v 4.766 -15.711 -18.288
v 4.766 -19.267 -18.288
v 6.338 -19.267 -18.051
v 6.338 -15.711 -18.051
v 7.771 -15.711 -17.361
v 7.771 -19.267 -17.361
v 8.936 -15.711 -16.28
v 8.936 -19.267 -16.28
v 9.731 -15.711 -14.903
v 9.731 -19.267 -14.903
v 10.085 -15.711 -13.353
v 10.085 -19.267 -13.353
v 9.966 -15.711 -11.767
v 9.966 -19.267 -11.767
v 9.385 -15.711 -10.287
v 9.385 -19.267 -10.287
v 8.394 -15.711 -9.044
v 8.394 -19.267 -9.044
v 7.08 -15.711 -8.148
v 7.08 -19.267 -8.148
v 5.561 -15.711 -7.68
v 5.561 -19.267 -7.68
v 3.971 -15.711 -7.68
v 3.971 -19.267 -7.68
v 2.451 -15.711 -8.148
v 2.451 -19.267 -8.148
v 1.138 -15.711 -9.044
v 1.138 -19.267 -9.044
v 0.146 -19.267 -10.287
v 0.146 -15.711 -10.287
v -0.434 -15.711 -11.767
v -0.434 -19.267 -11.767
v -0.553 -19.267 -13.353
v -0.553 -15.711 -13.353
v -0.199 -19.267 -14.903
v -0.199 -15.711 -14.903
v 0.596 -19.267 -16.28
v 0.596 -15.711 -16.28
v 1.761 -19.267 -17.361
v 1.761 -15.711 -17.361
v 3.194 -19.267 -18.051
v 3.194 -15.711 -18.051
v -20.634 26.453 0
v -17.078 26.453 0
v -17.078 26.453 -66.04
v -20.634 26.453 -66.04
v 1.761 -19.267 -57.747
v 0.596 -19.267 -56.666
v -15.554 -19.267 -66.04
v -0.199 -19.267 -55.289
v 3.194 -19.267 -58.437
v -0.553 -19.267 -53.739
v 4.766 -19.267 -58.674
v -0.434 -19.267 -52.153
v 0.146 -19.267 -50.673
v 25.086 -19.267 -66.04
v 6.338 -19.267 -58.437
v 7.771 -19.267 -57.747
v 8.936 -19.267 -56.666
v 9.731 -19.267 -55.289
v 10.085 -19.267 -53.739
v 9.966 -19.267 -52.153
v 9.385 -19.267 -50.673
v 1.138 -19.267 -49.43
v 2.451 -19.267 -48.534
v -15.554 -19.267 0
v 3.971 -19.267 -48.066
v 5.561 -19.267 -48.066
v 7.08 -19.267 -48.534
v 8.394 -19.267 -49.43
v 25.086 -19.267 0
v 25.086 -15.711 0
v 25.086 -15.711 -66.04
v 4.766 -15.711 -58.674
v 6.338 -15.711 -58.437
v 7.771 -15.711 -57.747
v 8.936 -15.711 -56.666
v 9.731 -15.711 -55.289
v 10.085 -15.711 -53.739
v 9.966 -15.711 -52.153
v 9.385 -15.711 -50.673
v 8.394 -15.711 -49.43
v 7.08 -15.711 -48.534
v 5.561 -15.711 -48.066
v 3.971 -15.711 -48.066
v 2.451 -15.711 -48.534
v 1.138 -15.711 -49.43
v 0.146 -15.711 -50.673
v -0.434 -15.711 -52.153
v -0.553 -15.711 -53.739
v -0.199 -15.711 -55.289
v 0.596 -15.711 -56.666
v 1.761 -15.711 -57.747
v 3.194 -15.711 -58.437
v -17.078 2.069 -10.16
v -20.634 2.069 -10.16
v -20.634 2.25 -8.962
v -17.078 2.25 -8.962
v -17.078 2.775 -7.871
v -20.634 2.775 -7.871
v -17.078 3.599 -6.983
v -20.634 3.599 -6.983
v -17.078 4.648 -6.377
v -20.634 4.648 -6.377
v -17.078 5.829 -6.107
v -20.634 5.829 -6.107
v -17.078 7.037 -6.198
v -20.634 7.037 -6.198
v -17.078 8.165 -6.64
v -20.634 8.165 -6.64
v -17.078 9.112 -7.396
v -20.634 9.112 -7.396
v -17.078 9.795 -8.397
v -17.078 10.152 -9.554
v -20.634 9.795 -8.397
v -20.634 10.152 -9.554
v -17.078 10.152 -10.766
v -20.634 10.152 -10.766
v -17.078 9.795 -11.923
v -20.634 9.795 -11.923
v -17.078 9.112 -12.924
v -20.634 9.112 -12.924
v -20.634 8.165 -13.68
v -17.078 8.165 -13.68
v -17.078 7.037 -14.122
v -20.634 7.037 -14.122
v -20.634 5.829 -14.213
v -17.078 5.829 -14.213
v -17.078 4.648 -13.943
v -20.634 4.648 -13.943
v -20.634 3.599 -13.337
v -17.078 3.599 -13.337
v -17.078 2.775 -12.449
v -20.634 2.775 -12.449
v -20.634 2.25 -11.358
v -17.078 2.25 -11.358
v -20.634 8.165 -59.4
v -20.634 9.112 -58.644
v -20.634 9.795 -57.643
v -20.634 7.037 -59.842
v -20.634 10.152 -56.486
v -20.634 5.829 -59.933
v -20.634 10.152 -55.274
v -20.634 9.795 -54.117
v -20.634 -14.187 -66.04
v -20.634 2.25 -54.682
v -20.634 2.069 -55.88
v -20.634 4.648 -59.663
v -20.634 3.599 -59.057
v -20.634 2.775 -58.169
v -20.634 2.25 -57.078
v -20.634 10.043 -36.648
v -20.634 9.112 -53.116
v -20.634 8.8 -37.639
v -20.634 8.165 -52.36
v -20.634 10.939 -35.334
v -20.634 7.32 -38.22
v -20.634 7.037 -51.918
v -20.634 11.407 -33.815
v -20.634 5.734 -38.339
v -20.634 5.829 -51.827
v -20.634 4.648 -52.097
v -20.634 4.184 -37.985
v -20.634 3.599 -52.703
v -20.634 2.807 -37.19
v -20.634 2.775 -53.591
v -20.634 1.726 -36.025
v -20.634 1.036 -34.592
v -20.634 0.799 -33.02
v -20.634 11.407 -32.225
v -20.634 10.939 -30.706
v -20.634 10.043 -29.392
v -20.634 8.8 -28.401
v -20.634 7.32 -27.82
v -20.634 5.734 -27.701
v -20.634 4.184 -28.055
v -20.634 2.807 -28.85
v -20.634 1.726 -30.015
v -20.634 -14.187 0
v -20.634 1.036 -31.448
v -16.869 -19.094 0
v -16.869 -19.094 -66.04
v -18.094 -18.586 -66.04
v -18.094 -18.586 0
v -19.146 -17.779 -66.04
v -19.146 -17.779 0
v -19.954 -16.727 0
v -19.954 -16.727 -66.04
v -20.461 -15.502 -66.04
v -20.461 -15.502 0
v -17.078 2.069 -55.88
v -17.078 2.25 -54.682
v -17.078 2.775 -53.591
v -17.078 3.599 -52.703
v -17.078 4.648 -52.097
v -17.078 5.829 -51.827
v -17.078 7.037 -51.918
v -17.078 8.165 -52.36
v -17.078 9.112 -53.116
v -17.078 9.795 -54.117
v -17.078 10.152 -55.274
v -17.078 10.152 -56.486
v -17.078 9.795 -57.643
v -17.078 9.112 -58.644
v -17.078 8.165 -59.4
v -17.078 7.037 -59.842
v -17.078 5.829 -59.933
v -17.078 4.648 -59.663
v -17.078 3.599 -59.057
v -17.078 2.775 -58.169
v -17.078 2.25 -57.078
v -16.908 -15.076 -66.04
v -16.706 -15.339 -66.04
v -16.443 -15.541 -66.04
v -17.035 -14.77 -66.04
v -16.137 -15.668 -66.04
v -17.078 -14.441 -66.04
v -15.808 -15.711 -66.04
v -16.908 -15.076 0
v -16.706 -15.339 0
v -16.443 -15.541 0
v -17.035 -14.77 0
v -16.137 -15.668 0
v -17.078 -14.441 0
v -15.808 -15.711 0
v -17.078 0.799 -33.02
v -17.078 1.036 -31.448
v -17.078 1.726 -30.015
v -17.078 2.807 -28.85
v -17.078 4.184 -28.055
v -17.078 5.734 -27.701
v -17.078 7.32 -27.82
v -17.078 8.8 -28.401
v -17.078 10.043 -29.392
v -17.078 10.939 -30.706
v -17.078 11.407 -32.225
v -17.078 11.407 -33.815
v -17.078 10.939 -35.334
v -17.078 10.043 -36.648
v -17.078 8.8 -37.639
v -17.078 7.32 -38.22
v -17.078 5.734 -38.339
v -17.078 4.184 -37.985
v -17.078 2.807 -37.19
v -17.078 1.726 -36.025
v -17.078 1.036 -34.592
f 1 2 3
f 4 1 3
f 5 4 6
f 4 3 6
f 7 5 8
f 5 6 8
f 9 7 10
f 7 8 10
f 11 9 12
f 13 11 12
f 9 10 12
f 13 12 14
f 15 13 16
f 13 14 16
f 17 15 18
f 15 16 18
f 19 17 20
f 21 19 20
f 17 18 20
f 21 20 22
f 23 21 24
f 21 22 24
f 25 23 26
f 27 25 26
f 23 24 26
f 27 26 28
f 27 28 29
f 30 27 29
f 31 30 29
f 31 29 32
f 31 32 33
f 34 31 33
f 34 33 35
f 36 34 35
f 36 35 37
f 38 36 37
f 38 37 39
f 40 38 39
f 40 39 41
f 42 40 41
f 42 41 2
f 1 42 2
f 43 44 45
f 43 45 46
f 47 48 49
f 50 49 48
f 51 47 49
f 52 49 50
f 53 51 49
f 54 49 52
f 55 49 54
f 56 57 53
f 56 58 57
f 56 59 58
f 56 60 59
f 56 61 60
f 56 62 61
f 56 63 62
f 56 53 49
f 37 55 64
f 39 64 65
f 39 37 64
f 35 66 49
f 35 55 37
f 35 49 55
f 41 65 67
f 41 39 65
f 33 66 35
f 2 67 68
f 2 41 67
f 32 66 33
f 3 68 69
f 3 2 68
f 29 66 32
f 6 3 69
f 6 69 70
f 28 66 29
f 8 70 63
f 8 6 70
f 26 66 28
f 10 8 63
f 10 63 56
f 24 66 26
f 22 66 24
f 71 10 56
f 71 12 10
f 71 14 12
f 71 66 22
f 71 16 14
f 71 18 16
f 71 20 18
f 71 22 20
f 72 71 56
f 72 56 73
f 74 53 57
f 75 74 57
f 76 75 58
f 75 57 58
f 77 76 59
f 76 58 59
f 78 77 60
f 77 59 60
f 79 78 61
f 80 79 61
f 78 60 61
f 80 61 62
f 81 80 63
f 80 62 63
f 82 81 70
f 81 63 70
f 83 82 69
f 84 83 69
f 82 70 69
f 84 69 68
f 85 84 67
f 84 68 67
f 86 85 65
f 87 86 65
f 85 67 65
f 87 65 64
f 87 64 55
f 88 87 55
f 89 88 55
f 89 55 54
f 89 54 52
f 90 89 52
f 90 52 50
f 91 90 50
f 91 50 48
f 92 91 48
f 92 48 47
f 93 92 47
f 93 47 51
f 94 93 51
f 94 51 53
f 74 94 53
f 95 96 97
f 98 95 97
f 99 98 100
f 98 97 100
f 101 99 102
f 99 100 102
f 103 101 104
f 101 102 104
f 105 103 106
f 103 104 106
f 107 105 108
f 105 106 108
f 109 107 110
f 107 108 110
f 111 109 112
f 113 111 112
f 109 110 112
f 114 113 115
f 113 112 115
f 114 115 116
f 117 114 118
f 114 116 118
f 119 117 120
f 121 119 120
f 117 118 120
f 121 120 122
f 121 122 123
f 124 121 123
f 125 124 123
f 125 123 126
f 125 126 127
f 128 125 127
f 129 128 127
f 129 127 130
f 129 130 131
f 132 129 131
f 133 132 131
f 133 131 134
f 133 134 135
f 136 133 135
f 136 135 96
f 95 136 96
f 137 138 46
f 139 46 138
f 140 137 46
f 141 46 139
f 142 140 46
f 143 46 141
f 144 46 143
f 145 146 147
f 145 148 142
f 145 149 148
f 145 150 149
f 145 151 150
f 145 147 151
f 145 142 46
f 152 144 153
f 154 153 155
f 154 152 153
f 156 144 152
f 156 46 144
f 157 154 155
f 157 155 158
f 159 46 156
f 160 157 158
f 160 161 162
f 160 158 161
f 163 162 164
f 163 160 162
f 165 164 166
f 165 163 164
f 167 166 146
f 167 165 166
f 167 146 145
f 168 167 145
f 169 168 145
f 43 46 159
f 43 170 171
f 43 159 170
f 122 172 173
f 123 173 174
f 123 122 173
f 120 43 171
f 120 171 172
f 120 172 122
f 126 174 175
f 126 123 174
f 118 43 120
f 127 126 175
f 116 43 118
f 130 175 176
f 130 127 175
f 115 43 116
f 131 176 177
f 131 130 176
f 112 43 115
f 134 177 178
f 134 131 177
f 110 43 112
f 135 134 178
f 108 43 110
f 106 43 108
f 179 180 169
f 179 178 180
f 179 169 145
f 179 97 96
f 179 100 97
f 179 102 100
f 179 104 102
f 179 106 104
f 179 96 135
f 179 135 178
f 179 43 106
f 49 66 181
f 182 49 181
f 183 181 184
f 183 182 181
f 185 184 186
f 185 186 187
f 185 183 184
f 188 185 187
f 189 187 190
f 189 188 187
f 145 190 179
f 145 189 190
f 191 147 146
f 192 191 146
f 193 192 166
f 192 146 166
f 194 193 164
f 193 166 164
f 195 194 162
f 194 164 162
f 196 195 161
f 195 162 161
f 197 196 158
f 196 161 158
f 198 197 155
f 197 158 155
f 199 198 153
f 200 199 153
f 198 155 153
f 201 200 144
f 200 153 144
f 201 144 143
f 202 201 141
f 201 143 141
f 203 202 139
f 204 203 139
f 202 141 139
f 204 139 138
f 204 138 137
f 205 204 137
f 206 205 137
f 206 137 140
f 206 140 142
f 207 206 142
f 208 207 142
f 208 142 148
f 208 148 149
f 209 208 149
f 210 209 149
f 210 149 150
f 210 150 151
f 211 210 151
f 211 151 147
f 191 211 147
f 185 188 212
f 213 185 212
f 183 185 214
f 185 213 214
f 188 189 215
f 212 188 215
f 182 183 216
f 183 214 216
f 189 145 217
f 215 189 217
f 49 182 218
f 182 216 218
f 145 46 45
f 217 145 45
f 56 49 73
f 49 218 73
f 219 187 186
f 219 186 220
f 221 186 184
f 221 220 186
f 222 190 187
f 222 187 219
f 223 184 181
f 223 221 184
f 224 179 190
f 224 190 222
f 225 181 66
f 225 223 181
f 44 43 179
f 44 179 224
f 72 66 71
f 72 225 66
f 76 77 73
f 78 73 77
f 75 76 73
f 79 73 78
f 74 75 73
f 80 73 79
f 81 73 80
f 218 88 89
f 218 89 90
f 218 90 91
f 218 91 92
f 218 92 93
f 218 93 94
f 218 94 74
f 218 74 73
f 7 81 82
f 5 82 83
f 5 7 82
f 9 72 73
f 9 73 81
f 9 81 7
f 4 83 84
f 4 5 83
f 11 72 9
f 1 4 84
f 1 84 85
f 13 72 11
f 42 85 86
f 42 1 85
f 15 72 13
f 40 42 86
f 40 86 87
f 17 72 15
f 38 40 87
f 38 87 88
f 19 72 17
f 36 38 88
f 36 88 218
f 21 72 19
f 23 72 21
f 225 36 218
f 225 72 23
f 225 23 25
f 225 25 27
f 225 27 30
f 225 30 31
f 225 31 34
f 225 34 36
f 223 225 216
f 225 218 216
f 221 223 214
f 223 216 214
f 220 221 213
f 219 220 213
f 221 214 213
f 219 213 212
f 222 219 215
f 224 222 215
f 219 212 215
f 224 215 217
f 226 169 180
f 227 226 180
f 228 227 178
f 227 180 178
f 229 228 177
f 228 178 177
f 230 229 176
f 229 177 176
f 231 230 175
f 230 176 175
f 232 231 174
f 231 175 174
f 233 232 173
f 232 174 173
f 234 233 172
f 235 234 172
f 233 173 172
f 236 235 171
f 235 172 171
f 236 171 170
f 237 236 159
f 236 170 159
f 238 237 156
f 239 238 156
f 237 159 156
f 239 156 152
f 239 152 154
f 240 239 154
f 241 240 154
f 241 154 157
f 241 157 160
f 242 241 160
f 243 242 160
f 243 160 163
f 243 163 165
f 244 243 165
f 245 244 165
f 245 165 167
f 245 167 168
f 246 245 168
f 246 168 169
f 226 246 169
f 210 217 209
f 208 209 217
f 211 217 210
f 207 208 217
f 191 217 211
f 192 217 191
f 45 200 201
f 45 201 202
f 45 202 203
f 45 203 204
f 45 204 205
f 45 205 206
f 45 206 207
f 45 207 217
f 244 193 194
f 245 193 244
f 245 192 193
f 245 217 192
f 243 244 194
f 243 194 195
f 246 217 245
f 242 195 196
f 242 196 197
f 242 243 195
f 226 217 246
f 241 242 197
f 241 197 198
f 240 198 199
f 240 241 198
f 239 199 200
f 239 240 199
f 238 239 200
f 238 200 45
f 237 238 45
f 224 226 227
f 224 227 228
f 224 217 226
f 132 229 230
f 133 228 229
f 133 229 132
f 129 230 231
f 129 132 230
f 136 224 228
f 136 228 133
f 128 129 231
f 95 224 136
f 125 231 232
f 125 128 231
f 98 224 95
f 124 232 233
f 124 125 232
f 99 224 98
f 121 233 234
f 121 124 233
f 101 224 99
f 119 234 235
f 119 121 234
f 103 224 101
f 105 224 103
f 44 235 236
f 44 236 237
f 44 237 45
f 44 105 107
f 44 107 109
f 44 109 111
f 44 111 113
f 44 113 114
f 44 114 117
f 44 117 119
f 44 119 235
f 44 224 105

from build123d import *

# Parameters (mm, degrees)
BOSS_EXTRUDE1_DEPTH = 66.04
FILLET1_R           = 1.27
FILLET3_R           = 5.08
SKETCH2_R           = 5.334
SKETCH2_R_2         = 4.064
CUT_EXTRUDE1_DEPTH  = 66.04
SKETCH3_R           = 5.334
CUT_EXTRUDE2_DEPTH  = 66.04


with BuildPart() as part:
    # Sketch1 → Boss-Extrude1 (new body)
    with BuildSketch(Plane.XY):
        Polygon((-20.634190635, 26.453063941), (-20.634190635, -19.266936059), (25.085809365, -19.266936059), (25.085809365, -15.710936059), (-17.078190635, -15.710936059), (-17.078190635, 26.453063941), align=None)
    extrude(amount=-BOSS_EXTRUDE1_DEPTH)

    # Fillet1
    fillet1_edges = [part.edges().sort_by_distance(p)[0] for p in [
        (-17.078190635, -15.710936059, -33.02),
    ]]
    fillet(fillet1_edges, radius=FILLET1_R)

    # Fillet3
    fillet3_edges = [part.edges().sort_by_distance(p)[0] for p in [
        (-20.634190635, -19.266936059, -33.02),
    ]]
    fillet(fillet3_edges, radius=FILLET3_R)

    # Sketch2 → Cut-Extrude1 (cut)
    with BuildSketch(Plane.ZY.offset(20.634190635)):
        with Locations(Location((-33.02, 6.133063941, 0), (0, 0, 270))):  # turned: the seam where the file's is
            Circle(SKETCH2_R)
        with Locations(Location((-55.88, 6.133063941, 0), (0, 0, 270))):  # turned: the seam where the file's is
            Circle(SKETCH2_R_2)
        with Locations(Location((-10.16, 6.133063941, 0), (0, 0, 270))):  # turned: the seam where the file's is
            Circle(SKETCH2_R_2)
    extrude(amount=-CUT_EXTRUDE1_DEPTH, mode=Mode.SUBTRACT)

    # Sketch3 → Cut-Extrude2 (cut)
    with BuildSketch(Plane(origin=(0, -19.266936059, 0), x_dir=(-1, 0, 0), z_dir=(0, -1, 0))):
        with Locations(Location((-4.765809365, 12.954, 0), (0, 0, 90))):  # turned: the seam where the file's is
            Circle(SKETCH3_R)
        with Locations(Location((-4.765809365, 53.34, 0), (0, 0, 90))):  # turned: the seam where the file's is
            Circle(SKETCH3_R)
    extrude(amount=-CUT_EXTRUDE2_DEPTH, mode=Mode.SUBTRACT)


solid = part.part
